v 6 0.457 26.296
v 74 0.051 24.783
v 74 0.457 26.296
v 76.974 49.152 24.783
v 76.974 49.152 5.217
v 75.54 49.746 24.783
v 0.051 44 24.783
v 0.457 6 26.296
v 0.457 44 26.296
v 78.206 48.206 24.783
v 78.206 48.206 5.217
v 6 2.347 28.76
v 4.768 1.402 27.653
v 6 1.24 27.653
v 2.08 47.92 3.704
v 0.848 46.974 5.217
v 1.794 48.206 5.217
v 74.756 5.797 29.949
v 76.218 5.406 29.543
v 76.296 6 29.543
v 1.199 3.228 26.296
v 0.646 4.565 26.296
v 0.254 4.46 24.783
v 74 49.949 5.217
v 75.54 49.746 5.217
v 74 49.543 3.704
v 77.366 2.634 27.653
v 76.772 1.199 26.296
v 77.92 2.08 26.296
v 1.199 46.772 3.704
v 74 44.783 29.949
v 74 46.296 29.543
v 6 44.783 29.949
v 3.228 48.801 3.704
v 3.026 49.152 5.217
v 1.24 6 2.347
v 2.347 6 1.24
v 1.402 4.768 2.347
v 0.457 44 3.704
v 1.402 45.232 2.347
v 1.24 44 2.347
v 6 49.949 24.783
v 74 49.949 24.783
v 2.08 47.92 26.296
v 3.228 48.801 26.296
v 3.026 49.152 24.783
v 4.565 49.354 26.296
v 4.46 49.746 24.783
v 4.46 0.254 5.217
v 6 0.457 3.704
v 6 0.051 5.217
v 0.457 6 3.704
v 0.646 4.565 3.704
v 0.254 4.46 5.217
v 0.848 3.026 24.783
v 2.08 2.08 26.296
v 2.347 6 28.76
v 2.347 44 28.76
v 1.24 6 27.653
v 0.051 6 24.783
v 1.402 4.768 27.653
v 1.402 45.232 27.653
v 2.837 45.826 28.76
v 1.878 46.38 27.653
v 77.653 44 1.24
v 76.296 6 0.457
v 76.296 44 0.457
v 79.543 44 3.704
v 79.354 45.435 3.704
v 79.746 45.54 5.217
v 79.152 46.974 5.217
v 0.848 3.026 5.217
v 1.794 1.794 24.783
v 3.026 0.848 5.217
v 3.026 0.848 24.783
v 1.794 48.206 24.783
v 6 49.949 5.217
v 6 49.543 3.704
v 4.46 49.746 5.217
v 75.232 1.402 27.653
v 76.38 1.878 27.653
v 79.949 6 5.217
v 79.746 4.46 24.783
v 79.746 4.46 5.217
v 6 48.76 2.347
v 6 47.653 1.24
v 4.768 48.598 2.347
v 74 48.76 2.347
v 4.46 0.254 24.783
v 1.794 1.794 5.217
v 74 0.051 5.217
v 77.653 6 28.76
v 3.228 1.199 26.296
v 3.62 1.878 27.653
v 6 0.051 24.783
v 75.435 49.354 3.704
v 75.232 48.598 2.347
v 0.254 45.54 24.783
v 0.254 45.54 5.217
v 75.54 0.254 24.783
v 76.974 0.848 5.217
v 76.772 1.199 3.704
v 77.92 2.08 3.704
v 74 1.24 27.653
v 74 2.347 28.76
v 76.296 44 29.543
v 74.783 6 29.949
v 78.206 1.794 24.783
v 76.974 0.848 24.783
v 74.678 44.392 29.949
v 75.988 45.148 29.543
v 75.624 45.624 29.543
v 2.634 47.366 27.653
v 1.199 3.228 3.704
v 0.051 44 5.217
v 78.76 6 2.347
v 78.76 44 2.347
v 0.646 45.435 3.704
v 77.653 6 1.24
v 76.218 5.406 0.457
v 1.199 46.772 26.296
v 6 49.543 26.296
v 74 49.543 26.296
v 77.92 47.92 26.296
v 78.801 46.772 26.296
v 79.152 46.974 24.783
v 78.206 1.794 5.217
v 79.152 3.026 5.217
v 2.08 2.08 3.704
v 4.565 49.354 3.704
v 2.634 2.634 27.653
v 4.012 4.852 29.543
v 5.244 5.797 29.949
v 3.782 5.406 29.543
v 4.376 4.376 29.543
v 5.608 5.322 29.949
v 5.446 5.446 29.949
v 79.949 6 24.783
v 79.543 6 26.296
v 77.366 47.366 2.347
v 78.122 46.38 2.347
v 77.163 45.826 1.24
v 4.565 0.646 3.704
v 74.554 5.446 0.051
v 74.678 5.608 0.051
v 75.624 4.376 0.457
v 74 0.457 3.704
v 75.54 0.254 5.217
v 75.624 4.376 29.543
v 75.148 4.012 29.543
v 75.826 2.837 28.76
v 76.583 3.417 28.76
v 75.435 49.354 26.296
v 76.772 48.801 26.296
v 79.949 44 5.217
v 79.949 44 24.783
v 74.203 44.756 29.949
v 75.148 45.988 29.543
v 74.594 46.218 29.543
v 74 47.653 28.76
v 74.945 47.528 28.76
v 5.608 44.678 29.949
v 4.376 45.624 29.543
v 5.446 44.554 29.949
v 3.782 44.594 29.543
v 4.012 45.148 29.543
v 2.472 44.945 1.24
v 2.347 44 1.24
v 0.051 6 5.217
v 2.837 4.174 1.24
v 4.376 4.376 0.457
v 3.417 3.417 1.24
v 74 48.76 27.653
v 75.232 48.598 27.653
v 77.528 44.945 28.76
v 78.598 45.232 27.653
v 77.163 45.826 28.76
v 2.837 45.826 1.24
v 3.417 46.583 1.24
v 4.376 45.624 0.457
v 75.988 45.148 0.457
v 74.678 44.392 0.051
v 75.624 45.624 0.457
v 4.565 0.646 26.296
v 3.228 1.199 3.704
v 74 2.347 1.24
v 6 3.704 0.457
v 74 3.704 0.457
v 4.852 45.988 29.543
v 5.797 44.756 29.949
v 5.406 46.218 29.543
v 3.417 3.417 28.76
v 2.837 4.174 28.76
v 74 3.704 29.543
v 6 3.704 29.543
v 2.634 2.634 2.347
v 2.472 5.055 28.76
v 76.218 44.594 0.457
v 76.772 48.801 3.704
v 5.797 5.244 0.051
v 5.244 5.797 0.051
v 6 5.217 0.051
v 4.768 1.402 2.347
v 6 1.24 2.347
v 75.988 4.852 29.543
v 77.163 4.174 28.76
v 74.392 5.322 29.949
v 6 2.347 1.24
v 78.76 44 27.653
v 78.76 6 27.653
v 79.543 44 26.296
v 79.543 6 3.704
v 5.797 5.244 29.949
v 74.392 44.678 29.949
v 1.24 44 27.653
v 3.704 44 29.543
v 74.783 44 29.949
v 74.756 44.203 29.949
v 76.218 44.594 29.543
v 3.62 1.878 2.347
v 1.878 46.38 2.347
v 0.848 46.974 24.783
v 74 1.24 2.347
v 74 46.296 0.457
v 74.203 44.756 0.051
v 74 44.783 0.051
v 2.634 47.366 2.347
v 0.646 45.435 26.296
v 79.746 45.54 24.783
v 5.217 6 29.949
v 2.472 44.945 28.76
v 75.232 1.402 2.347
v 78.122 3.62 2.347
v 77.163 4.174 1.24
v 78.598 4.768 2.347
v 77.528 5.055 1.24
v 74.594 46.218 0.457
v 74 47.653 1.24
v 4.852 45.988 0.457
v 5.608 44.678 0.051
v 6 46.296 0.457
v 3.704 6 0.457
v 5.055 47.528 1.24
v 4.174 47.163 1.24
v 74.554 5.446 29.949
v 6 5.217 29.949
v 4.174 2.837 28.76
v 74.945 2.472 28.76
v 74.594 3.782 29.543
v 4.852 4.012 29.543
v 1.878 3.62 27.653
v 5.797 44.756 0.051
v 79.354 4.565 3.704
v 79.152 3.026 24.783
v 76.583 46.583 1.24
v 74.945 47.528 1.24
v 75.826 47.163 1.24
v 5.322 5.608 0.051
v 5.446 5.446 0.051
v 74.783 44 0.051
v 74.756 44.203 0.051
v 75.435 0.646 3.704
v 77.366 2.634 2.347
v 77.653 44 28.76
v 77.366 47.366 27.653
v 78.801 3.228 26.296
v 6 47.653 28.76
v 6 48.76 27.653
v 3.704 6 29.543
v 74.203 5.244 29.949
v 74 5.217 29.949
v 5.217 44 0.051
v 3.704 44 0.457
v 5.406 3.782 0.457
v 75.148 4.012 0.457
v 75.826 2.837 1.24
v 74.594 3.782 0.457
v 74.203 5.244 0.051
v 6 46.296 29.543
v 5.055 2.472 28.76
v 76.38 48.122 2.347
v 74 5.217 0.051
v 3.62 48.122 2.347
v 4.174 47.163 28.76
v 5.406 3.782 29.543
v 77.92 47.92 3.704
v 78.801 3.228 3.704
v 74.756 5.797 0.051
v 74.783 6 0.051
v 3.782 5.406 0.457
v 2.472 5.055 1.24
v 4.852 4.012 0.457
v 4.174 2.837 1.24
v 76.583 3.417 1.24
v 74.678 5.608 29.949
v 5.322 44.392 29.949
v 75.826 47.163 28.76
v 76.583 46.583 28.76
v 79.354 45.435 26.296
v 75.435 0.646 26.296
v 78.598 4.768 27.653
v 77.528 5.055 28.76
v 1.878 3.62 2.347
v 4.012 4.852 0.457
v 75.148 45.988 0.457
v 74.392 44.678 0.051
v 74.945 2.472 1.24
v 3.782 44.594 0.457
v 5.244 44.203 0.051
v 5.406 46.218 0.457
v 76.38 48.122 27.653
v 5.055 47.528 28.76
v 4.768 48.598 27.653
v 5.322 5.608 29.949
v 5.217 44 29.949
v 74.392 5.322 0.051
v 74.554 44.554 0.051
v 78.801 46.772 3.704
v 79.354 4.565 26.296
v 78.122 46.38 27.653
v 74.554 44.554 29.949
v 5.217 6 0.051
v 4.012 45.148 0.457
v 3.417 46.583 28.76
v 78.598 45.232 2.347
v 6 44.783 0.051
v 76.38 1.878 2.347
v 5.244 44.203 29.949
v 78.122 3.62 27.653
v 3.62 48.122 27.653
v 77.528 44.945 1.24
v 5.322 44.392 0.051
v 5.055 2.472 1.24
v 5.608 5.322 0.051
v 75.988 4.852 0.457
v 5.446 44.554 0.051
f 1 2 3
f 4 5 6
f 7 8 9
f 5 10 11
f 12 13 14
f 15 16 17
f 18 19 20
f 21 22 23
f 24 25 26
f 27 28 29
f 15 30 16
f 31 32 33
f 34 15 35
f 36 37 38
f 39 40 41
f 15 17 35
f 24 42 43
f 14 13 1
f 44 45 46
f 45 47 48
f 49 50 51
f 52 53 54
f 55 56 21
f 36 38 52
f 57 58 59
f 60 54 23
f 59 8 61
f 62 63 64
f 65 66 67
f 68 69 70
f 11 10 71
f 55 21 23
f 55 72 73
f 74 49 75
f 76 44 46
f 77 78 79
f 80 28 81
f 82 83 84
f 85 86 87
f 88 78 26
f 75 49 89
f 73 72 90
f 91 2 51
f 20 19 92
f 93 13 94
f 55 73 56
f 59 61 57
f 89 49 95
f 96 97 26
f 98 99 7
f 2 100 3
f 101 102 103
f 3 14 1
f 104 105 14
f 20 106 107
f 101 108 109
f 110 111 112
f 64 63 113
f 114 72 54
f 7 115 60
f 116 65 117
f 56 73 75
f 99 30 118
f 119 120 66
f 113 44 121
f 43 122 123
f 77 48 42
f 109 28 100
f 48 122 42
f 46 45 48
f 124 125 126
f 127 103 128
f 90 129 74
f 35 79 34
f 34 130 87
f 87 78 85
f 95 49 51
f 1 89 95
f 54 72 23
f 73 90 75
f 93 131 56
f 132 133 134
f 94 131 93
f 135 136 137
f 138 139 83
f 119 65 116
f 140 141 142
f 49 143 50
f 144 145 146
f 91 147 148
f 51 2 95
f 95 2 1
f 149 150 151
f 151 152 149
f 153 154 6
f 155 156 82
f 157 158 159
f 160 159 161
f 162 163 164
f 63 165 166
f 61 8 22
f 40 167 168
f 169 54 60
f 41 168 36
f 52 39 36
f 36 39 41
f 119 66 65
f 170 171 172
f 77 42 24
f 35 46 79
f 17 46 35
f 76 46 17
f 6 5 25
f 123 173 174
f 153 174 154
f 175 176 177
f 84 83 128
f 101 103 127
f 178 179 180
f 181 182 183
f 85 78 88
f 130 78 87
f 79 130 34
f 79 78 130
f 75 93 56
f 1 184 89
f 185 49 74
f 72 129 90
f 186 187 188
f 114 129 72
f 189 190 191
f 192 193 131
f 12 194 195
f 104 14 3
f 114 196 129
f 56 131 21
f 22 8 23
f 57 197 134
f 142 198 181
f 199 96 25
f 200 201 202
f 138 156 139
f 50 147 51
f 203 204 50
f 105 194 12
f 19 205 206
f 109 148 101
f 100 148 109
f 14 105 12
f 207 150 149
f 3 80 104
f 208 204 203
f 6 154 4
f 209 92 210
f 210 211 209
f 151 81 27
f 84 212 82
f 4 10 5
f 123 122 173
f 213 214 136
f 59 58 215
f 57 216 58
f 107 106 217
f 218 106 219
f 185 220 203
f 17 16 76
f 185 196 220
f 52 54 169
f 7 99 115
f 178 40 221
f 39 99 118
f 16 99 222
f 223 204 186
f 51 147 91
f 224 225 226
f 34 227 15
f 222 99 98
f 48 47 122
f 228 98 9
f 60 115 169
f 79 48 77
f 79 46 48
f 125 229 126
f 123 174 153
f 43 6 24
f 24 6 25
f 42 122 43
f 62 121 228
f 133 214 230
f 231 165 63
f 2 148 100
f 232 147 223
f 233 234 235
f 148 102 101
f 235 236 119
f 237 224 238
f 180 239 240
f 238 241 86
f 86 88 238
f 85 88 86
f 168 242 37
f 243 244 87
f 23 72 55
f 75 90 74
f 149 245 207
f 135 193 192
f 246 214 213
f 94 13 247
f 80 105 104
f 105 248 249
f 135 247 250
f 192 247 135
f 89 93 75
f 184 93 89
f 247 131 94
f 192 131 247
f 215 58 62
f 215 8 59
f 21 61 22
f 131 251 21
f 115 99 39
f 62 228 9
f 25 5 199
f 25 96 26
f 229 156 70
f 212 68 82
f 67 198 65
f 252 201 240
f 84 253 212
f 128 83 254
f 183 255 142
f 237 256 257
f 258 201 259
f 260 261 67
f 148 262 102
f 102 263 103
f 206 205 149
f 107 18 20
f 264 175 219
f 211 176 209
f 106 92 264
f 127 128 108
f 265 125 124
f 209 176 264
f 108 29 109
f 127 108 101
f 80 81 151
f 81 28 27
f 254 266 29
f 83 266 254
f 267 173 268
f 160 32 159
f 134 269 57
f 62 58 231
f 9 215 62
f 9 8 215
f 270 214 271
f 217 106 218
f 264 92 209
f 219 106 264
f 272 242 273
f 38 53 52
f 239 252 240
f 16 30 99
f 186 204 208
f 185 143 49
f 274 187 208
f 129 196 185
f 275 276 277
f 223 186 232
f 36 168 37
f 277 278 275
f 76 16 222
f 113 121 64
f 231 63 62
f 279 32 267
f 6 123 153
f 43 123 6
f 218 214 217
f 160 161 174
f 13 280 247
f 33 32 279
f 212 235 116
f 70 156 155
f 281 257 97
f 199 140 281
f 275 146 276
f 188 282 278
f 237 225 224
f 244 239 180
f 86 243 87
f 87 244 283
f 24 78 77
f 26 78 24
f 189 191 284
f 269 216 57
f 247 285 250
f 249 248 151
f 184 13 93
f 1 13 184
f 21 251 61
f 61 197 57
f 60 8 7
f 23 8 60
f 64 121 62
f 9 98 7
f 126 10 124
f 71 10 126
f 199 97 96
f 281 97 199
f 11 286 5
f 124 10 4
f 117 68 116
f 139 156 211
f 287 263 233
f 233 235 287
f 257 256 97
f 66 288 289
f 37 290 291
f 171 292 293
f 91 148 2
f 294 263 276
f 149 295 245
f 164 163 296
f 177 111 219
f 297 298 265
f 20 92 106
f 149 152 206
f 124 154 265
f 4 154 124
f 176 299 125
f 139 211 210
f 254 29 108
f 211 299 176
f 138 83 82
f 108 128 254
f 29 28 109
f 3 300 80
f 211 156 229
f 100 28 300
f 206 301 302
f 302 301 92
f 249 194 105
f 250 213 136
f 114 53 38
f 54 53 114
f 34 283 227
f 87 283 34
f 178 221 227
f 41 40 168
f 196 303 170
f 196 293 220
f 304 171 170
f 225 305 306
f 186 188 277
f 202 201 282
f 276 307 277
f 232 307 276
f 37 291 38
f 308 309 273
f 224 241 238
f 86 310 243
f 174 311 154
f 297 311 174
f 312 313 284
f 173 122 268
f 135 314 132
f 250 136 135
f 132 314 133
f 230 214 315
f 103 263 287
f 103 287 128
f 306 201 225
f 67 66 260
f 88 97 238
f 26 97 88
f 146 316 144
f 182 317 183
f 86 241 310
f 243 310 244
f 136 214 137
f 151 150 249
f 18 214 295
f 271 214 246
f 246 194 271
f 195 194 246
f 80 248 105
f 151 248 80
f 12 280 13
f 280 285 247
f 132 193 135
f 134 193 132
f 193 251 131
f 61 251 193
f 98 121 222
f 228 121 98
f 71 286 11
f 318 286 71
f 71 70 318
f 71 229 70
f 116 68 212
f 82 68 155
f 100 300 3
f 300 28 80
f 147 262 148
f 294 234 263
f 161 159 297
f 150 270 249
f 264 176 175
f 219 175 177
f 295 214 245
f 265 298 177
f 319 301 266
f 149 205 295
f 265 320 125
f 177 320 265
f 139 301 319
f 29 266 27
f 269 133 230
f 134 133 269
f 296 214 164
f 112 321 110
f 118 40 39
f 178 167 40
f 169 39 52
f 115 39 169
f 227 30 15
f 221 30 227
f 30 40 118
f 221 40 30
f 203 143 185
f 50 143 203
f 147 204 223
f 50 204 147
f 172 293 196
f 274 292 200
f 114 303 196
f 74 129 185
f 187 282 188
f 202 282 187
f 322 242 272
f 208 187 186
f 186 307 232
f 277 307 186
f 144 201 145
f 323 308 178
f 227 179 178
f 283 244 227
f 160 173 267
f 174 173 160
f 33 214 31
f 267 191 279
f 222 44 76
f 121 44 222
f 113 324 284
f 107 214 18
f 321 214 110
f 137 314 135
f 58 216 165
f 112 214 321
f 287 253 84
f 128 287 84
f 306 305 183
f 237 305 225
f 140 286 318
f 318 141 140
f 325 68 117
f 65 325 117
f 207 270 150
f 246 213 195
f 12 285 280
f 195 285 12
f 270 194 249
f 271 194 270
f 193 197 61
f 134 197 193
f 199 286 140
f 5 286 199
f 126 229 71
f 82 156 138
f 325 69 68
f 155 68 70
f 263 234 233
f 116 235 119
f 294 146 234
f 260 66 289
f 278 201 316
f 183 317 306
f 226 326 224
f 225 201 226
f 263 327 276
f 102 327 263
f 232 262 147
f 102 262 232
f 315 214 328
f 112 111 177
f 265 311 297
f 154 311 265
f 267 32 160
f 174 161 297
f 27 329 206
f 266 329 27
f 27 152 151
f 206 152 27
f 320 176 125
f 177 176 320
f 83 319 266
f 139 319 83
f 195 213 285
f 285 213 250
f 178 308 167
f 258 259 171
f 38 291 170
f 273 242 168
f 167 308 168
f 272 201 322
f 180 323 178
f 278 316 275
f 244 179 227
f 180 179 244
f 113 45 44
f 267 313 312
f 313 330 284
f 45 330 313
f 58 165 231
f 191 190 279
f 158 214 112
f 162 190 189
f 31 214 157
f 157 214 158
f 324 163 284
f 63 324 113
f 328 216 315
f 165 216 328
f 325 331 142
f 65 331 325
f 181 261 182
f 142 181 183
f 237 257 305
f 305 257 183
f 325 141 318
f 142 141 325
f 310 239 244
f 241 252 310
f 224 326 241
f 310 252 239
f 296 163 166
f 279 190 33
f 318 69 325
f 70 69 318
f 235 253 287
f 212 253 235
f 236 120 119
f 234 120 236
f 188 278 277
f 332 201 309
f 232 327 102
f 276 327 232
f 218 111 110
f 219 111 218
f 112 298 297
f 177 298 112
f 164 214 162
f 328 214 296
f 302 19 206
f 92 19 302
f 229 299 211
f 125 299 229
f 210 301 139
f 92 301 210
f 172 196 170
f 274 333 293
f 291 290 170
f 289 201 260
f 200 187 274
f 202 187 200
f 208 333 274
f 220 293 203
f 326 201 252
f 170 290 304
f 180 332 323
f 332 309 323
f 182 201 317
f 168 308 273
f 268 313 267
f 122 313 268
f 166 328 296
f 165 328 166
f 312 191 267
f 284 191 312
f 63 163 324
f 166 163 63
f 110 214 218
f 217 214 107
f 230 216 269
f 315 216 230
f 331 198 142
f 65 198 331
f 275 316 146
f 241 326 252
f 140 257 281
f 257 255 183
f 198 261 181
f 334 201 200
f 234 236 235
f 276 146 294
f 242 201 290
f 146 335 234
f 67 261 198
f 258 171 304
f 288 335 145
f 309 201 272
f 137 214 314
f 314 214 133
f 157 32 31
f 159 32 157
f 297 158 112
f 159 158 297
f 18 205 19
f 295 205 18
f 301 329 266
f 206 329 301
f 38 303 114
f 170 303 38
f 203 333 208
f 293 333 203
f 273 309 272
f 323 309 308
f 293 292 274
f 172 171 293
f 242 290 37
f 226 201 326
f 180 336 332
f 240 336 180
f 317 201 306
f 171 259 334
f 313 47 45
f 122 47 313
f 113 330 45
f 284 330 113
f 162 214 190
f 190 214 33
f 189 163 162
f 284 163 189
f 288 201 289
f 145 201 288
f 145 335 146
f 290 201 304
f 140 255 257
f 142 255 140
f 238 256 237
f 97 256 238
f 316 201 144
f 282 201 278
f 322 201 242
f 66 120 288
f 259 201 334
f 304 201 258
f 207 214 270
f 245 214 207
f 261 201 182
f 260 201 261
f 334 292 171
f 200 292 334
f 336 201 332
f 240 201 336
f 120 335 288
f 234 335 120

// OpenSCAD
// Tools: Rounded box utility module

module rounded_box(size=[100,60,40], radius=5) {
    x = size[0]; y = size[1]; z = size[2];
    hull() {
        for (tx = [radius, x-radius])
            for (ty = [radius, y-radius])
                for (tz = [radius, z-radius])
                    translate([tx, ty, tz])
                        sphere(r=radius, $fn=24);
    }
}

rounded_box(size=[80, 50, 30], radius=6);
